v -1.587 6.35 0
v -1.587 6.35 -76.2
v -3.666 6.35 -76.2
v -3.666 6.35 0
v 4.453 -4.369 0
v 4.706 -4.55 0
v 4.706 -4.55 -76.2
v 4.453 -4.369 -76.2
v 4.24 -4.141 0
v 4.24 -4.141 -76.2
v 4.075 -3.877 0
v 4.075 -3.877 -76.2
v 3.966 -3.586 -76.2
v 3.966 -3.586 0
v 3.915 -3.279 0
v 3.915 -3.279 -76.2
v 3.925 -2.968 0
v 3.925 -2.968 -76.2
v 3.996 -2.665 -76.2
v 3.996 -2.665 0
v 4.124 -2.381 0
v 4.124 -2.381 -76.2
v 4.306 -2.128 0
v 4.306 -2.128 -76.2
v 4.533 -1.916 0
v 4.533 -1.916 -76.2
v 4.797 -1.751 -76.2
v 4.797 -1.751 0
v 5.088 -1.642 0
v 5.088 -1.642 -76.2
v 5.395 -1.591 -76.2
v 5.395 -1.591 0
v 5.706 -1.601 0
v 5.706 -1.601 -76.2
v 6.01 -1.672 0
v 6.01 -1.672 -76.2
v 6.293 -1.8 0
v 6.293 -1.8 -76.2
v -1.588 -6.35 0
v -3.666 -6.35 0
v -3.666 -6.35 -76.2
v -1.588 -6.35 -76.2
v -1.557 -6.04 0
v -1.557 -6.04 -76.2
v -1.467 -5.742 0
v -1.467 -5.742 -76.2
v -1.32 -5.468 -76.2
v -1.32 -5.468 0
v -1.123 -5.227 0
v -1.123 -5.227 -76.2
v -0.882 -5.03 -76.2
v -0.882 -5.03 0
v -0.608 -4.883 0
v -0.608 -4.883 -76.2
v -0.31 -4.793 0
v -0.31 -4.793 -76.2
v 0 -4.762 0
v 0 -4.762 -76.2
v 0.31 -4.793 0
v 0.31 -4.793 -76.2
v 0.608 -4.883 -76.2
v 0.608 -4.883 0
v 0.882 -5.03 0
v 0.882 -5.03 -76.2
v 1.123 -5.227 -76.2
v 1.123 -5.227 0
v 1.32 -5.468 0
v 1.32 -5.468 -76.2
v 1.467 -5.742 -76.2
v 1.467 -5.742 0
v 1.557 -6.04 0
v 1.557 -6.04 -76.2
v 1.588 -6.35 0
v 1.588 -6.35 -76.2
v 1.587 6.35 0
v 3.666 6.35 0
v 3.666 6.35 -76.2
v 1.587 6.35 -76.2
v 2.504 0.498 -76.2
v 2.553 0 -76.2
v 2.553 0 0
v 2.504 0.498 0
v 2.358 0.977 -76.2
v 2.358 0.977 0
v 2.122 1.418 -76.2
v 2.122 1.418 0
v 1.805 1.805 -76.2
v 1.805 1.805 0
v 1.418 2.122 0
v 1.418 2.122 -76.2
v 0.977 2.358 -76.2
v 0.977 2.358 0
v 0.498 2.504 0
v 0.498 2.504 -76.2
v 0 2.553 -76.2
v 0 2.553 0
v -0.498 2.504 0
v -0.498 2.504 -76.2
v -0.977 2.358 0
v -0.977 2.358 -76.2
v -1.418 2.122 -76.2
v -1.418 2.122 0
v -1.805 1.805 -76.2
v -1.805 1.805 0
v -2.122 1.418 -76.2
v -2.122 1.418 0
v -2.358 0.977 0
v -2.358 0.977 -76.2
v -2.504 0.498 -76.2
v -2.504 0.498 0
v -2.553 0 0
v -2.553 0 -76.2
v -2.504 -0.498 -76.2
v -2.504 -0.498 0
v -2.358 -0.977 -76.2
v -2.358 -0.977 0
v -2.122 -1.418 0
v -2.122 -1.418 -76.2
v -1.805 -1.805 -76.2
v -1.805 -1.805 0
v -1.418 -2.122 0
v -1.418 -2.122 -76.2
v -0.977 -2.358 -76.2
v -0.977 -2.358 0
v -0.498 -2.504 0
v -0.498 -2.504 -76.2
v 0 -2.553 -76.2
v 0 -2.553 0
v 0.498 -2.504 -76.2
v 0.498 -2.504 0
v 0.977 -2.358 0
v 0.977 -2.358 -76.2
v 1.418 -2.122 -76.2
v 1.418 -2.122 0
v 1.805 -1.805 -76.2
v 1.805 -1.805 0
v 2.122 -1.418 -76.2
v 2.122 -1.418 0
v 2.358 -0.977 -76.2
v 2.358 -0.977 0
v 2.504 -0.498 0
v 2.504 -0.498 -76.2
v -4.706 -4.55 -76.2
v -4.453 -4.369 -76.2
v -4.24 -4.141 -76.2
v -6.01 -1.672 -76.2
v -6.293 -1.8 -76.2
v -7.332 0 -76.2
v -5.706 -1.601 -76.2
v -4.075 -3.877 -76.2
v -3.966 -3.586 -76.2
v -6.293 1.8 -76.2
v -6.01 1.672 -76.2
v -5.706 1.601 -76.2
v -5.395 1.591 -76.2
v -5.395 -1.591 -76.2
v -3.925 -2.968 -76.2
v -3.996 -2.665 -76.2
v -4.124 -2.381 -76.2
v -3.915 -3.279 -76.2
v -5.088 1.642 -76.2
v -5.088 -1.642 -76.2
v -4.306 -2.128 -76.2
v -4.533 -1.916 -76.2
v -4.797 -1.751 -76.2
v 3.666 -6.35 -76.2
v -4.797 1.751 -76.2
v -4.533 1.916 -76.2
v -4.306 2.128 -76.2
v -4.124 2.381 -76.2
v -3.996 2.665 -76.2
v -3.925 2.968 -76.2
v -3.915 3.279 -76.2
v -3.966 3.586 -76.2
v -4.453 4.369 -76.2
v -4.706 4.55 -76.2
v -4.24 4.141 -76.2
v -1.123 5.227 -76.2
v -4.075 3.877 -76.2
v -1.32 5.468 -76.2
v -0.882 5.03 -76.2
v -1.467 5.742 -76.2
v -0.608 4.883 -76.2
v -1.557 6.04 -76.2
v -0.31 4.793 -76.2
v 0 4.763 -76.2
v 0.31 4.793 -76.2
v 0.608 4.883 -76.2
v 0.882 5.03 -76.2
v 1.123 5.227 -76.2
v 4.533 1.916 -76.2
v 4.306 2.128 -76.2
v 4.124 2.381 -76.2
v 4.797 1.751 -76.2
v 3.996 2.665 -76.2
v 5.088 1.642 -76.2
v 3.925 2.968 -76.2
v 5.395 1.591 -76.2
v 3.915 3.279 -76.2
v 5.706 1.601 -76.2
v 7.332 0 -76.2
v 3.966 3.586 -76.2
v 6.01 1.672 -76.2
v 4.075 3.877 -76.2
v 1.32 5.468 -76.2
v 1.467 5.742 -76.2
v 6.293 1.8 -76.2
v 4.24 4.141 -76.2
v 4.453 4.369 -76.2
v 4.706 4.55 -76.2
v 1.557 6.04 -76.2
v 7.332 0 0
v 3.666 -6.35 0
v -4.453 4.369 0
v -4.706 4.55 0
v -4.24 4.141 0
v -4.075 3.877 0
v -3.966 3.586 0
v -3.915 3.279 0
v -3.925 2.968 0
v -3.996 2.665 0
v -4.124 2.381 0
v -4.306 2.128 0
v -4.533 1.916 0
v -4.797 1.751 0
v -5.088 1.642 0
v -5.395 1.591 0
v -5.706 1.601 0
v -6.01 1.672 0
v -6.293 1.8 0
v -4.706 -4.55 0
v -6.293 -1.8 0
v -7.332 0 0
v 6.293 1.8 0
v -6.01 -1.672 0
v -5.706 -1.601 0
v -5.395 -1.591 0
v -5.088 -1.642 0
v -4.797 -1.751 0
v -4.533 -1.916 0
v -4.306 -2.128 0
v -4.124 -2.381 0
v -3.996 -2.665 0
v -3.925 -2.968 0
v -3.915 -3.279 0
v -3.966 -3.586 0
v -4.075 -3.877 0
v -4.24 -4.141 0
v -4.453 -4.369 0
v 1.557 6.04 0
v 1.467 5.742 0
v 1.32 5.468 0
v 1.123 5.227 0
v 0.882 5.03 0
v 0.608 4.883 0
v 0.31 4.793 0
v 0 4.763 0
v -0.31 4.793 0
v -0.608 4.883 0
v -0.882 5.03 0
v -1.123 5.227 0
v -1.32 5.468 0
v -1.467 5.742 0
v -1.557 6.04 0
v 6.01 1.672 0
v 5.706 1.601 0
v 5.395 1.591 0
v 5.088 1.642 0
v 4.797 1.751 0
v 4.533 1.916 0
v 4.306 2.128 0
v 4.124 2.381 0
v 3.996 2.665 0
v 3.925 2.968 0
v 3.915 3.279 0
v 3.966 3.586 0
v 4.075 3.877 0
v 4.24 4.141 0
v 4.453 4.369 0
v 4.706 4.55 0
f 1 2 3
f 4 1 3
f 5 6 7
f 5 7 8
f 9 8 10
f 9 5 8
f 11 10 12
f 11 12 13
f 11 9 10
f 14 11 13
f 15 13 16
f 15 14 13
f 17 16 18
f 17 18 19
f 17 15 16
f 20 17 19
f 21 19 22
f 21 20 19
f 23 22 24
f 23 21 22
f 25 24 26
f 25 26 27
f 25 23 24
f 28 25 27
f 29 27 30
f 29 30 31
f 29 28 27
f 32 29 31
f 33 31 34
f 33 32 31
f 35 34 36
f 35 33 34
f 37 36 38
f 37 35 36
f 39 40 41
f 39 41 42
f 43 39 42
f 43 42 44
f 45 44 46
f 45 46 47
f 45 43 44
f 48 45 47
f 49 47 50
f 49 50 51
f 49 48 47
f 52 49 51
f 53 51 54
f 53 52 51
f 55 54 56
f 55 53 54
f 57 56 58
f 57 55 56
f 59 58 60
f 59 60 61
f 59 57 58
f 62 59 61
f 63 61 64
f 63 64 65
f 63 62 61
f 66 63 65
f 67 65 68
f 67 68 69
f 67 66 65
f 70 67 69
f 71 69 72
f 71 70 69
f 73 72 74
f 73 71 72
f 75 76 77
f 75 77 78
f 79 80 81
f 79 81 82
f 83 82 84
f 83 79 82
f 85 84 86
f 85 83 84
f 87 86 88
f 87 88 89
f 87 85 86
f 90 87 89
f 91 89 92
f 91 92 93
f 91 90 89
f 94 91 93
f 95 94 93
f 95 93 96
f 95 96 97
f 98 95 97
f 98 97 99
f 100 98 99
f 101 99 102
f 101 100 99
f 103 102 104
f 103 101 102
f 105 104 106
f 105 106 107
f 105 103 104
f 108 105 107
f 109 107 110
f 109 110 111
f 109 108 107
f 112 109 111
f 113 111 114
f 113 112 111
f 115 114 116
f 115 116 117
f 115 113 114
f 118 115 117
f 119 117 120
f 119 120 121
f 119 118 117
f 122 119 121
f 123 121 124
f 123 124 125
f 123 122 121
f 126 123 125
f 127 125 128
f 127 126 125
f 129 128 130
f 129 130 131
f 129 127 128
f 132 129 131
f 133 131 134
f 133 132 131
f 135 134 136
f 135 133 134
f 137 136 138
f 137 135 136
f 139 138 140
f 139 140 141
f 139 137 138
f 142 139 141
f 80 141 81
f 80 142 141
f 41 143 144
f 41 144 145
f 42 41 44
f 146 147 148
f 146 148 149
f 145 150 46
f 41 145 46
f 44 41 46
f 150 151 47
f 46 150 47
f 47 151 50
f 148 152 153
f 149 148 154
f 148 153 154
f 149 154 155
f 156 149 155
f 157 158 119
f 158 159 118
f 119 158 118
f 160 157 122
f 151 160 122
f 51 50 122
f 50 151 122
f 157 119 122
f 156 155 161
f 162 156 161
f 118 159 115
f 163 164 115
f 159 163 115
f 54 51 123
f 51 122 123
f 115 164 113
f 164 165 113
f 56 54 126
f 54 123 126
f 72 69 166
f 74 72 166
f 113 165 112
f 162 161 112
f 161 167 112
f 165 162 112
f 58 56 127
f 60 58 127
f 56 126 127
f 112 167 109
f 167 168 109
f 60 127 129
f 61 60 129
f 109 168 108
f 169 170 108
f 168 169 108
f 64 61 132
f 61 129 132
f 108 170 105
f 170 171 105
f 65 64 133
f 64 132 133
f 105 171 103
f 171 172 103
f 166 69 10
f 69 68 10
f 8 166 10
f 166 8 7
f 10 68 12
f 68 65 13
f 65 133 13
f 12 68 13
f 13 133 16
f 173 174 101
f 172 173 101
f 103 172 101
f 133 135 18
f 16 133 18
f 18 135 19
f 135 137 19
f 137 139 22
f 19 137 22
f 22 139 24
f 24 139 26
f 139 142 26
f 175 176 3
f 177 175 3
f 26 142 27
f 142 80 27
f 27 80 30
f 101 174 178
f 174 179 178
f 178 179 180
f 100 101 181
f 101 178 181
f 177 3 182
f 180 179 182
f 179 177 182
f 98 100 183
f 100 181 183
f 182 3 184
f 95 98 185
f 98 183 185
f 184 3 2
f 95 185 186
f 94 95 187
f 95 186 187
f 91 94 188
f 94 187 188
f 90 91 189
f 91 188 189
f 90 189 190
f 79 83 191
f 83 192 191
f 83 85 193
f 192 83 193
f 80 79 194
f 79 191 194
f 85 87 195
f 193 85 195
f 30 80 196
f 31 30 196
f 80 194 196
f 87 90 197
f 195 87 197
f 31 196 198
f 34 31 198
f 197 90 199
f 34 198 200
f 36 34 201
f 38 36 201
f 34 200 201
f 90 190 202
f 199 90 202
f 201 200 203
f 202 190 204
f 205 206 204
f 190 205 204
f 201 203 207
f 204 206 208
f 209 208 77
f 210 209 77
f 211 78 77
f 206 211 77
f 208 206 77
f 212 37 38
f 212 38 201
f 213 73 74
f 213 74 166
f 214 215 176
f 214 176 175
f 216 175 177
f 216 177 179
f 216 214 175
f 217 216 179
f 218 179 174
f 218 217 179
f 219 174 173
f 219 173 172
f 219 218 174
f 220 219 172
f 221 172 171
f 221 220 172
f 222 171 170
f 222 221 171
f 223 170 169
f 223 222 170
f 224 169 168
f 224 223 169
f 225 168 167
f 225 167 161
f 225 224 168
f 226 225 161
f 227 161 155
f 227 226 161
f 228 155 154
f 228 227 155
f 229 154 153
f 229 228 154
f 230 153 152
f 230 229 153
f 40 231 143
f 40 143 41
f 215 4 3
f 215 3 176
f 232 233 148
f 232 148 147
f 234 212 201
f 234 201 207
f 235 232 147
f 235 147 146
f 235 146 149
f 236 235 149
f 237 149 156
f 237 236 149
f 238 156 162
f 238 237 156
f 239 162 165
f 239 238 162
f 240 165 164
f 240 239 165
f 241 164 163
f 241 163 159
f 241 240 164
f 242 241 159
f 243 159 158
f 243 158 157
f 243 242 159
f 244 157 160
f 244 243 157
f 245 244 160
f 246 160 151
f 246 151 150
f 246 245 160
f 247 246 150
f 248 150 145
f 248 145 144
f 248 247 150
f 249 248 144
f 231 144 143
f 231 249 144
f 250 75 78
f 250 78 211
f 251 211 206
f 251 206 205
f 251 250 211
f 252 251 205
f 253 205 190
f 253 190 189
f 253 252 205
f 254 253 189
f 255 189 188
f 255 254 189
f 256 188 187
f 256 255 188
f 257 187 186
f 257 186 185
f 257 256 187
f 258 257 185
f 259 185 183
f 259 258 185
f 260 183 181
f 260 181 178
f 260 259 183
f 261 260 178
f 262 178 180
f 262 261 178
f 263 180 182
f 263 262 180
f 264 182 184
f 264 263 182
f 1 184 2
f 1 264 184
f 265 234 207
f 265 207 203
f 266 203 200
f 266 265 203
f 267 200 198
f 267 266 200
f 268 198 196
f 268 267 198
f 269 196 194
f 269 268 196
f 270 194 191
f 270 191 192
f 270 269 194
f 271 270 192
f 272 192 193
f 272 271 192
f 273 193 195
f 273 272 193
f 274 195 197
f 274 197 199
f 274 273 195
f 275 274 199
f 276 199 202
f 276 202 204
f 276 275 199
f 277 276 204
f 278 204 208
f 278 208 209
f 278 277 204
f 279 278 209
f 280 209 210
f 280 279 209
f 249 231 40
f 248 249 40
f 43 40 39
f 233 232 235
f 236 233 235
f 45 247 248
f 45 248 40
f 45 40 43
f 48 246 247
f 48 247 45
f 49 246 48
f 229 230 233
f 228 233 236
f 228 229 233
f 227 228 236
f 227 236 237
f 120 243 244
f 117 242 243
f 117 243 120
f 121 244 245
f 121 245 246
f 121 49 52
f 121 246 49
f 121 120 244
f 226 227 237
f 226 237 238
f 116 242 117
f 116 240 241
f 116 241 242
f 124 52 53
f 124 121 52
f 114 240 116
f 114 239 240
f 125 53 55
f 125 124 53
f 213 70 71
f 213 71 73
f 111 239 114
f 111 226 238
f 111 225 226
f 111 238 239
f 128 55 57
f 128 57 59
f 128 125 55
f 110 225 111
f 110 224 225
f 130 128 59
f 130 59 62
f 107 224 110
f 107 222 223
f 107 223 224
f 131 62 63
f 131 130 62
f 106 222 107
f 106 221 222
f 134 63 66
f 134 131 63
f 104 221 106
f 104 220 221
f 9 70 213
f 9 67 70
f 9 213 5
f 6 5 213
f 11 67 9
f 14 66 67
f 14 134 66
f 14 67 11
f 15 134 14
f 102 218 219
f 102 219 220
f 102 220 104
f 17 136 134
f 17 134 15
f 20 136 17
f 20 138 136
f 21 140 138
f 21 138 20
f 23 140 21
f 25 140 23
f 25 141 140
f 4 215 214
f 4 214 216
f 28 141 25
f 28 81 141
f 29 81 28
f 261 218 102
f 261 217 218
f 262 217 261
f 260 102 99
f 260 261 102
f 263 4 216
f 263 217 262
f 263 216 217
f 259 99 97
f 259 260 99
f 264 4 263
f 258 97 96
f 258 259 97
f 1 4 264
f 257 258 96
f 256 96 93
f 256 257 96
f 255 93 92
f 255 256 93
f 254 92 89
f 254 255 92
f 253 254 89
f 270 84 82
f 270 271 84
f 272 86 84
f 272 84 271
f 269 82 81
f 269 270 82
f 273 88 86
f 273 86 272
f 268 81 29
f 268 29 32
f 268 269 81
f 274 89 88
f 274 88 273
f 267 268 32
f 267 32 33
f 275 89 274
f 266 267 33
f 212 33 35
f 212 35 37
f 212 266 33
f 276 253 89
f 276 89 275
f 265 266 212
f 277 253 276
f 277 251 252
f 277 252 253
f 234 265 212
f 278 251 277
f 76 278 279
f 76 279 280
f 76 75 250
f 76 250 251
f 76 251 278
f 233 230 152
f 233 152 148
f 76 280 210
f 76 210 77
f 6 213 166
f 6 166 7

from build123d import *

# Parameters (mm, degrees)
BOSS_EXTRUDE1_DEPTH             = 76.2
F_1_4_20_START                  = -76.2
F_1_4_20_TAPPED_HOLE2_OUTLINE_R = 2.5527
F_1_4_20_TAPPED_HOLE2_DEPTH     = 76.2


# Read off the part's stored shape, not the designer's step: 1/4-20 Tapped Hole2
with BuildPart() as part:
    # Sketch1 → Boss-Extrude1 (new body)
    with BuildSketch(Plane.XY):
        with BuildLine():
            Line((-4.70551159, -4.549815043), (-3.666174521, -6.349999904))
            Line((-3.666174521, -6.349999904), (-1.587501923, -6.349999904))
            ThreePointArc((-1.587501923, -6.349999904), (-3.85e-07, -4.762498365), (1.587501923, -6.349999904))
            Line((1.587501923, -6.349999904), (3.666173825, -6.349999904))
            Line((3.666173825, -6.349999904), (4.705510929, -4.549815232))
            ThreePointArc((4.705510929, -4.549815232), (4.124445601, -2.381249904), (6.293010929, -1.800184575))
            Line((6.293010929, -1.800184575), (7.332348034, 9.6e-08))
            Line((7.332348034, 9.6e-08), (6.293011178, 1.800184715))
            ThreePointArc((6.293011178, 1.800184715), (4.124445902, 2.381250241), (4.705511428, 4.549815516))
            Line((4.705511428, 4.549815516), (3.666174521, 6.350000222))
            Line((3.666174521, 6.350000222), (1.587498077, 6.350000222))
            ThreePointArc((1.587498077, 6.350000222), (3.85e-07, 4.76250253), (-1.587498077, 6.350000222))
            Line((-1.587498077, 6.350000222), (-3.666173825, 6.350000222))
            Line((-3.666173825, 6.350000222), (-4.705511038, 4.549815614))
            ThreePointArc((-4.705511038, 4.549815614), (-4.124445841, 2.38125025), (-6.293011205, 1.800185053))
            Line((-6.293011205, 1.800185053), (-7.332348419, 4.44e-07))
            Line((-7.332348419, 4.44e-07), (-6.293011423, -1.80018429))
            ThreePointArc((-6.293011423, -1.80018429), (-4.12444613, -2.38124975), (-4.70551159, -4.549815043))
        make_face()
    extrude(amount=-BOSS_EXTRUDE1_DEPTH)

    # 1/4-20 Tapped Hole2 outline → 1/4-20 Tapped Hole2 (cut)
    with BuildSketch(Plane.XY.offset(F_1_4_20_START)):
        Circle(F_1_4_20_TAPPED_HOLE2_OUTLINE_R)
    extrude(amount=F_1_4_20_TAPPED_HOLE2_DEPTH, mode=Mode.SUBTRACT)


solid = part.part
